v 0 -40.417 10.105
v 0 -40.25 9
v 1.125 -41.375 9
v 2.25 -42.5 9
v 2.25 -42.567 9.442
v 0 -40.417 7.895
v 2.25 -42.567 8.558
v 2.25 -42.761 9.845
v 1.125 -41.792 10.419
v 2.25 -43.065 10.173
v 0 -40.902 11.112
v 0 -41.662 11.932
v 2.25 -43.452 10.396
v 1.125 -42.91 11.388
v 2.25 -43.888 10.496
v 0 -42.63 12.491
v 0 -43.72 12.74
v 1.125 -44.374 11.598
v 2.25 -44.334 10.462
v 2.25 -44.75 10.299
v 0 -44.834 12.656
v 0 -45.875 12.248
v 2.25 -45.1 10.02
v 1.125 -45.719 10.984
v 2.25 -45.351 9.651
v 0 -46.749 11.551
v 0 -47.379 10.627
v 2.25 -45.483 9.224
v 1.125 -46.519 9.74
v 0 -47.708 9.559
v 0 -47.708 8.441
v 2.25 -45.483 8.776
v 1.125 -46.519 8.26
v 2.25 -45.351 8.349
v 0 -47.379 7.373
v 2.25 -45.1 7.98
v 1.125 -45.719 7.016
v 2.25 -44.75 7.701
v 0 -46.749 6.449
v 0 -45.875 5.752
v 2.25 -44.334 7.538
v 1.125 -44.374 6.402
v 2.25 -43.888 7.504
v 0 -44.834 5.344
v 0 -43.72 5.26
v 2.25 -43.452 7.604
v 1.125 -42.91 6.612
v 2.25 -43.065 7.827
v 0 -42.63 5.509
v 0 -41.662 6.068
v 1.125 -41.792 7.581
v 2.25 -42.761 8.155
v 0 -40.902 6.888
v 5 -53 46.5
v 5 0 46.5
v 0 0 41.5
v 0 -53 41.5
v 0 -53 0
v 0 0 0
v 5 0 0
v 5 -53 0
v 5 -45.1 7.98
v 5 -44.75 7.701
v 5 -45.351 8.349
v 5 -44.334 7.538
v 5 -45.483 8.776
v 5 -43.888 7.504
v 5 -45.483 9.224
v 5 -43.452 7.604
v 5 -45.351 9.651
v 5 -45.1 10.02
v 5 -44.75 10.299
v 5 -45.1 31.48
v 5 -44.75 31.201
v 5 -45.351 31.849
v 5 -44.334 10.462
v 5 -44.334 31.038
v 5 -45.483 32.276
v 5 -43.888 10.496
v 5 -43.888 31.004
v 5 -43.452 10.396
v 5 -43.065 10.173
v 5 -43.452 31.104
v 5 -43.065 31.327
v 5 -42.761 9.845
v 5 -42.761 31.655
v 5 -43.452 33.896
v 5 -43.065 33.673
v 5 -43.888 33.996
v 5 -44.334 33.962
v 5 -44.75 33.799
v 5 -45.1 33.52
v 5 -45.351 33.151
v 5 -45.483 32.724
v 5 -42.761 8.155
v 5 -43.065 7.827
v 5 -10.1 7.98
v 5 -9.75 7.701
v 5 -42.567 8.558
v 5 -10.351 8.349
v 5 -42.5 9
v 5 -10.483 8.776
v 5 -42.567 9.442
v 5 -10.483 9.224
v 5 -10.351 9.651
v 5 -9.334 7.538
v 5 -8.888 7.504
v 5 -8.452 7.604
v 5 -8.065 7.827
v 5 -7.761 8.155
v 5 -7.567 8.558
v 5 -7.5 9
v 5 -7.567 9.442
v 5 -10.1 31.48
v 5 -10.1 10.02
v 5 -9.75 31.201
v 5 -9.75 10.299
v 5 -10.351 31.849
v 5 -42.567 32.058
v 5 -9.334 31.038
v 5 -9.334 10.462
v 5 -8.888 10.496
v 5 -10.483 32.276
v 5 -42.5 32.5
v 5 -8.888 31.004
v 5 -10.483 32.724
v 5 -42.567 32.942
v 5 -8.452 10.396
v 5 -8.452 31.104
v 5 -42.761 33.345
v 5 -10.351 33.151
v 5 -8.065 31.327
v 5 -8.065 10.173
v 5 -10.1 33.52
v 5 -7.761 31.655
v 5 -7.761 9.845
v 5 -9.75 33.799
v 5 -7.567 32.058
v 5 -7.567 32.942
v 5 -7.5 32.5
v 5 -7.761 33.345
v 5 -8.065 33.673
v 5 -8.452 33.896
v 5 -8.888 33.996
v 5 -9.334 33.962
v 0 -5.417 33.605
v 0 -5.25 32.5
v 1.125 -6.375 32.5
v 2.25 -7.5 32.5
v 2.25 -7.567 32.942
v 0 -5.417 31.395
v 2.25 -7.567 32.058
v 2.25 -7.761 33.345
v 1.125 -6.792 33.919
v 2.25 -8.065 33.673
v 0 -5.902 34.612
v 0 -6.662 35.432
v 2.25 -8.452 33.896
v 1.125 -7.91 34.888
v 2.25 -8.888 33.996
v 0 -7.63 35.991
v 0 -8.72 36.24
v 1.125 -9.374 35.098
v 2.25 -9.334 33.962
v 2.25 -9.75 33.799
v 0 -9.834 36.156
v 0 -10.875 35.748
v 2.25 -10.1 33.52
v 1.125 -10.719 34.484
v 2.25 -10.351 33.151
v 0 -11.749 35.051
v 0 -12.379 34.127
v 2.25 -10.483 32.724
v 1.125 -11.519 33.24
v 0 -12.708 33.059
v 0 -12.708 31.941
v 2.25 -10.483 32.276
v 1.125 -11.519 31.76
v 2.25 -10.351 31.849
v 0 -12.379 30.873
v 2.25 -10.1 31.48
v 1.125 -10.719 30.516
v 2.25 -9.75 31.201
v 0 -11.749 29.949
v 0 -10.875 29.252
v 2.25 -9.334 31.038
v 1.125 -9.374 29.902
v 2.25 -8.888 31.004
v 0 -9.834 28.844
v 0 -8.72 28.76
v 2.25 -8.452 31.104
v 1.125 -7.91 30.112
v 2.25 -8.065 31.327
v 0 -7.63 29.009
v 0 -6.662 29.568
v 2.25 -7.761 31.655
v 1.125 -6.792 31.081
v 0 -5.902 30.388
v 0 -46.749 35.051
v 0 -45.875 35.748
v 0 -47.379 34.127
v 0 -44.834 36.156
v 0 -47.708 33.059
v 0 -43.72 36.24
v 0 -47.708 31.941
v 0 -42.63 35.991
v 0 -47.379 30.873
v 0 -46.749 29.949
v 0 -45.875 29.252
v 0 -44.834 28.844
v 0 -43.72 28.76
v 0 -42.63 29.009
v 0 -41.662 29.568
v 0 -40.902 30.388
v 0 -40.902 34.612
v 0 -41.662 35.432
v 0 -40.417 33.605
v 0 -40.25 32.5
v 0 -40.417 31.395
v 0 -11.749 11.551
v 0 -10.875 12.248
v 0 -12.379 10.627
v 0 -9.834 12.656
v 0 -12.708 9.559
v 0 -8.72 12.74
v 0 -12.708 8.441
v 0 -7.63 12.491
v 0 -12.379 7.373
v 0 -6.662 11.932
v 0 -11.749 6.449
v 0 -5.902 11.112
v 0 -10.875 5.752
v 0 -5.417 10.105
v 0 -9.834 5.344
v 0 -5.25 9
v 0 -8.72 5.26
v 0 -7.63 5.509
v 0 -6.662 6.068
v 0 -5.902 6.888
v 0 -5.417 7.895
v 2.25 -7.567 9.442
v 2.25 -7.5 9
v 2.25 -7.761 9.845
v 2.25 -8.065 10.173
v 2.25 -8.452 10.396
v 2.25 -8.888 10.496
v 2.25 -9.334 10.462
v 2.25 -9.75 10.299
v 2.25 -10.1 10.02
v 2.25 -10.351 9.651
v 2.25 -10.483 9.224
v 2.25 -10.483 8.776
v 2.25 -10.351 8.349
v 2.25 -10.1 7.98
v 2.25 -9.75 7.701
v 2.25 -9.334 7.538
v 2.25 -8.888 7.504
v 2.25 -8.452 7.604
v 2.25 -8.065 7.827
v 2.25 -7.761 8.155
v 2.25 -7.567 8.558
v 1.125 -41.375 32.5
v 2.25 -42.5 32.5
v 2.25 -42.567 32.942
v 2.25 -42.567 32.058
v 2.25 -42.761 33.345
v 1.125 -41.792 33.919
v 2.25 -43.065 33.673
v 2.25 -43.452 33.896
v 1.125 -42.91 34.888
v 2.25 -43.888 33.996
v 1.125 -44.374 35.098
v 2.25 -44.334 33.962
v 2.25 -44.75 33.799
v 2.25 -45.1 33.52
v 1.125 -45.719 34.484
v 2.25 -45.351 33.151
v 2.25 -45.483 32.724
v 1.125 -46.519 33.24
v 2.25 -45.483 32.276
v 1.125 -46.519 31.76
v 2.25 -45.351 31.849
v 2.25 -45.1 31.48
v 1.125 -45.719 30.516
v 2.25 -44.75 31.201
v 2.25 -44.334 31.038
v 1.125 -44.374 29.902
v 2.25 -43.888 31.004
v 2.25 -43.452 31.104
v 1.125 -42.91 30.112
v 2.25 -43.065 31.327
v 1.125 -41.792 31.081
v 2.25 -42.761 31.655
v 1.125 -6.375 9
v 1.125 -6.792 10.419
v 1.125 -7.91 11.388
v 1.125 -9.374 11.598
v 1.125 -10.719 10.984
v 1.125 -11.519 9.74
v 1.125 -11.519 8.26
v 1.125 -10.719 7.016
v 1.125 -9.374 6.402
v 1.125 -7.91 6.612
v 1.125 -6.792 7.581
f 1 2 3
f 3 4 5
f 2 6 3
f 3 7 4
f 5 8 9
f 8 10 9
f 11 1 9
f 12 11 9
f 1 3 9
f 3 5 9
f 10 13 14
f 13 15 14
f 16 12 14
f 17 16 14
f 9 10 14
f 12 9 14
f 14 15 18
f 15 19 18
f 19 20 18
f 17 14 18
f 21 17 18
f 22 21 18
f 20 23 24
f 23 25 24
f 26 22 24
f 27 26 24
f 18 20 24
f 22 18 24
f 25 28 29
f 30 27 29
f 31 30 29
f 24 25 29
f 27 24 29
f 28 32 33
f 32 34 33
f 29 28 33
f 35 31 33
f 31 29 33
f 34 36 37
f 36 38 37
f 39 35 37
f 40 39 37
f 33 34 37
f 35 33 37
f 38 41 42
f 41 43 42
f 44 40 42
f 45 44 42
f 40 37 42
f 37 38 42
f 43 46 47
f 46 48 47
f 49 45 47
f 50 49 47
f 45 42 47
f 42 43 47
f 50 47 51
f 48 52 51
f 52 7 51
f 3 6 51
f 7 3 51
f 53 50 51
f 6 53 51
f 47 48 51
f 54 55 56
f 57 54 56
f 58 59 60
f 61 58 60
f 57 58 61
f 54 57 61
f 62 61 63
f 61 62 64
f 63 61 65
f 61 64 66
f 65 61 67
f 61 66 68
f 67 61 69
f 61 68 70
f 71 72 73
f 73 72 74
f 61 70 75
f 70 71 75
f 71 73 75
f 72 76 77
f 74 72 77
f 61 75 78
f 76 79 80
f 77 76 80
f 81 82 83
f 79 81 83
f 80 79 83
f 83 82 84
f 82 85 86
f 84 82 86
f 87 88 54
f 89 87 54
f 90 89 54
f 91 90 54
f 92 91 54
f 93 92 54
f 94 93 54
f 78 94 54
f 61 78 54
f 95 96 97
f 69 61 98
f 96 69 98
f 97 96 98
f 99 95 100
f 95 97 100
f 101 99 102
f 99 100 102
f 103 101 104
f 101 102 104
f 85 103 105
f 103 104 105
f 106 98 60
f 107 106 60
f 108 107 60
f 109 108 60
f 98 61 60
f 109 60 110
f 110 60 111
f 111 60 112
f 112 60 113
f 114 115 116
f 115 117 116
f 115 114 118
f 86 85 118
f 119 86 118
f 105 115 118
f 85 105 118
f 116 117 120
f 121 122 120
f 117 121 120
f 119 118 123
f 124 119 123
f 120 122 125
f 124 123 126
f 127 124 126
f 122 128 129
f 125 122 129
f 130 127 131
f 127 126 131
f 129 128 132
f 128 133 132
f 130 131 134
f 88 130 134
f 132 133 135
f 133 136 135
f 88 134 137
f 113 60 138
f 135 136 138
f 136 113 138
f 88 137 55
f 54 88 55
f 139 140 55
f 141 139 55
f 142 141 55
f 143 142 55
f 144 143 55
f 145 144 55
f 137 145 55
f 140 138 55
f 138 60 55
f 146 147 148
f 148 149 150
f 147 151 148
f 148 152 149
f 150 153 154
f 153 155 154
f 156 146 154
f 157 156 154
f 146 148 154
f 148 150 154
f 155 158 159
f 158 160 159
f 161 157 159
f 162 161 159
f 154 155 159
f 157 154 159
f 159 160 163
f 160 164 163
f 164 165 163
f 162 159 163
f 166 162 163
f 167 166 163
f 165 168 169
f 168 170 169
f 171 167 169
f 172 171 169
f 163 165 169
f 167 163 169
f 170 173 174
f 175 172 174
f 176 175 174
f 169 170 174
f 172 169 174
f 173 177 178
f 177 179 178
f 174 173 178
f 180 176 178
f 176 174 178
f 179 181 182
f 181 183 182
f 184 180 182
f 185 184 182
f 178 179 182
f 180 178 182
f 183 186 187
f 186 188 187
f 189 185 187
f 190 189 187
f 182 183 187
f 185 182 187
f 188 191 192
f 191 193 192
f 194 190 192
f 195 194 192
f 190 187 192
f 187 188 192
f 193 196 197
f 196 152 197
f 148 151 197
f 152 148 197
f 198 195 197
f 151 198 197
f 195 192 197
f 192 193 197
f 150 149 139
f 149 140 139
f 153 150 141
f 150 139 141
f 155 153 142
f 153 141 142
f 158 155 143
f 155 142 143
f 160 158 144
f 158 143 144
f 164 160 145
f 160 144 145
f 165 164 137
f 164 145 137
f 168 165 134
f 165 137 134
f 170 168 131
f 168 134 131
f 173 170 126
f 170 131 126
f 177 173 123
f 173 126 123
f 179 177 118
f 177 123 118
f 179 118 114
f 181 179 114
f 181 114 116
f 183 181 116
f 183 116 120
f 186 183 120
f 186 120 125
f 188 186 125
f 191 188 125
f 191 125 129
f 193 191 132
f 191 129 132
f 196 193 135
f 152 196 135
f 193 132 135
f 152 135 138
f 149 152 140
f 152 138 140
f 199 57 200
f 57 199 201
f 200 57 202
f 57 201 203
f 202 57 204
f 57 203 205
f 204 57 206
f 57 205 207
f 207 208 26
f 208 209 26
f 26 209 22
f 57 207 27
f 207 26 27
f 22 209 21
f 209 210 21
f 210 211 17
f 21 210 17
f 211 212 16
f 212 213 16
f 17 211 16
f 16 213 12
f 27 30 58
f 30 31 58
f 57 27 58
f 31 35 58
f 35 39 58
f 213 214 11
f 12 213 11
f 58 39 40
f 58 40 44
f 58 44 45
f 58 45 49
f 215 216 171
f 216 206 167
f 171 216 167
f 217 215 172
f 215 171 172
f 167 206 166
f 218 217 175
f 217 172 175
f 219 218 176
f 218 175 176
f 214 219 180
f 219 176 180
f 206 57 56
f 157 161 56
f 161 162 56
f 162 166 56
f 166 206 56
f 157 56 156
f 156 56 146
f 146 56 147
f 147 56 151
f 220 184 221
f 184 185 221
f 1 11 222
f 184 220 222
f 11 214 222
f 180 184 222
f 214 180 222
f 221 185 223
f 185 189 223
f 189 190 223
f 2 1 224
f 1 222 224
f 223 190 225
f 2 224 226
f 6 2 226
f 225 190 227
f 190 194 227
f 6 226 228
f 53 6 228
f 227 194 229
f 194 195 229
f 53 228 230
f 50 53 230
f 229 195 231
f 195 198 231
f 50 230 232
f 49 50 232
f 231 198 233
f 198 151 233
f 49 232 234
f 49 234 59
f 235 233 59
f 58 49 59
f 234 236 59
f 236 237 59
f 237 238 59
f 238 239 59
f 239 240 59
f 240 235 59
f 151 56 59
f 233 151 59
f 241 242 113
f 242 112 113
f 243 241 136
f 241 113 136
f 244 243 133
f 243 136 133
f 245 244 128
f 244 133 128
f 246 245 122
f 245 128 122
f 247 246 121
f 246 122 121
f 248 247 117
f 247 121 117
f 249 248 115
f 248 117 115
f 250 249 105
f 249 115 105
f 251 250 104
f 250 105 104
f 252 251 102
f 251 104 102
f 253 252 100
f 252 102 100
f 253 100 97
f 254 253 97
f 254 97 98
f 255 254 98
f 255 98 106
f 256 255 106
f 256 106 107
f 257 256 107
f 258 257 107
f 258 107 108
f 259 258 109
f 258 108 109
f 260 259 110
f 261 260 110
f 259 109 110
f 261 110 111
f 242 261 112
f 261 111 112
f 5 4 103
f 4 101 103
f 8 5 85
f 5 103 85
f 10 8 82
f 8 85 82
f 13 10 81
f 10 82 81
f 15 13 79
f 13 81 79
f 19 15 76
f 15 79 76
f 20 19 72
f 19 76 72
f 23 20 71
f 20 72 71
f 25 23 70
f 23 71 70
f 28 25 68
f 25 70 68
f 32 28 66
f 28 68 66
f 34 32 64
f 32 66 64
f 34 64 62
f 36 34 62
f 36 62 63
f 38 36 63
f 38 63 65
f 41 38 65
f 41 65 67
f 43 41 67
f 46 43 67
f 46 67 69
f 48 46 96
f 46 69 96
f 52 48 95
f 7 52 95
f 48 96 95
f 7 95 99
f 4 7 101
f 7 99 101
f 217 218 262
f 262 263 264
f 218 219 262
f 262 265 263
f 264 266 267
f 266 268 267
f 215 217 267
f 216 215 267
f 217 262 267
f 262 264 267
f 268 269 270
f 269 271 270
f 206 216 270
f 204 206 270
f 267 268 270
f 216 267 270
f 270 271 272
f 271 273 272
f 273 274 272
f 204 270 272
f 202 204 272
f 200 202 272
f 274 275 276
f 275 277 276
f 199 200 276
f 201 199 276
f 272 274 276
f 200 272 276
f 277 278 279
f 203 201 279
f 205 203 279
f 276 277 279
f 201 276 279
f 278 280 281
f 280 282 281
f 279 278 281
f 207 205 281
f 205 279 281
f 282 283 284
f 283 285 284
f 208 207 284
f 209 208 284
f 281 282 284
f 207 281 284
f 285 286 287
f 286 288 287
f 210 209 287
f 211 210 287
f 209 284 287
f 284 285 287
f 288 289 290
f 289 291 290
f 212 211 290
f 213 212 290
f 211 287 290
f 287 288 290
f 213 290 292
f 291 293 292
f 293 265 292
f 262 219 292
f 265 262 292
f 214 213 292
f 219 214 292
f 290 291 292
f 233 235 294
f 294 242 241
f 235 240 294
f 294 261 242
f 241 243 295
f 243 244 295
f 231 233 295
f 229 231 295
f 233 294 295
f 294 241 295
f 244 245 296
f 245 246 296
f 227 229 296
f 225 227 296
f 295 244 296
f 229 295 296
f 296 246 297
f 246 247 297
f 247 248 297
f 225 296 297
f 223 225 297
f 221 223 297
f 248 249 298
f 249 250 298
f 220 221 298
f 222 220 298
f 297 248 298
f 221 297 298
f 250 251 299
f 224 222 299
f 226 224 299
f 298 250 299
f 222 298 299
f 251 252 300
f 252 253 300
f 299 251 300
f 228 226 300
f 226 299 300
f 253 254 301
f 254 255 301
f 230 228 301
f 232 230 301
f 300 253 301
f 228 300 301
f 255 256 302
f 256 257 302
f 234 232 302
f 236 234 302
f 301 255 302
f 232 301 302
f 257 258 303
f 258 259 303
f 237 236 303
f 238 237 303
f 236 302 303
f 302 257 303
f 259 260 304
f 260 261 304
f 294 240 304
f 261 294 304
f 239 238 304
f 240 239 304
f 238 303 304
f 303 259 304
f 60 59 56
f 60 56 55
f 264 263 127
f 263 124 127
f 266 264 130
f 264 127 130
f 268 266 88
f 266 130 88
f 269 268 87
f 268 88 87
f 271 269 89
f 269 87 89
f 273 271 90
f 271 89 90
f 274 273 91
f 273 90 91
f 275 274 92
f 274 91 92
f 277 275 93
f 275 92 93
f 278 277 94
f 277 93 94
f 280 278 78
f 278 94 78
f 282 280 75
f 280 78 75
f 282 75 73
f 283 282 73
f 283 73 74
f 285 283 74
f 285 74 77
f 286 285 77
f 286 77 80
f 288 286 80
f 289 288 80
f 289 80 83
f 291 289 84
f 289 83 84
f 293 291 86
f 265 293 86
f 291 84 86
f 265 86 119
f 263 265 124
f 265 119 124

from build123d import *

# Parameters (mm, degrees)
F1_DEPTH       = 53
F3_D           = 3
F3_CSINK_D     = 7.5
F3_CSINK_ANGLE = 90


with BuildPart() as f1:
    # F0 (on Front) → F1 (new body)
    with BuildSketch(Plane.XZ):
        Polygon((0, 41.5), (0, 0), (5, 0), (5, 46.5), align=None)
    extrude(amount=F1_DEPTH)

    # F3 (through all)
    with Locations(Plane(origin=(0, 0, 0), x_dir=(0, -1, 0), z_dir=(-1, 0, 0))):
        with Locations((9, 32.5), (44, 32.5), (44, 9), (9, 9)):
            CounterSinkHole(F3_D / 2, F3_CSINK_D / 2, counter_sink_angle=F3_CSINK_ANGLE)


solid = f1.part
